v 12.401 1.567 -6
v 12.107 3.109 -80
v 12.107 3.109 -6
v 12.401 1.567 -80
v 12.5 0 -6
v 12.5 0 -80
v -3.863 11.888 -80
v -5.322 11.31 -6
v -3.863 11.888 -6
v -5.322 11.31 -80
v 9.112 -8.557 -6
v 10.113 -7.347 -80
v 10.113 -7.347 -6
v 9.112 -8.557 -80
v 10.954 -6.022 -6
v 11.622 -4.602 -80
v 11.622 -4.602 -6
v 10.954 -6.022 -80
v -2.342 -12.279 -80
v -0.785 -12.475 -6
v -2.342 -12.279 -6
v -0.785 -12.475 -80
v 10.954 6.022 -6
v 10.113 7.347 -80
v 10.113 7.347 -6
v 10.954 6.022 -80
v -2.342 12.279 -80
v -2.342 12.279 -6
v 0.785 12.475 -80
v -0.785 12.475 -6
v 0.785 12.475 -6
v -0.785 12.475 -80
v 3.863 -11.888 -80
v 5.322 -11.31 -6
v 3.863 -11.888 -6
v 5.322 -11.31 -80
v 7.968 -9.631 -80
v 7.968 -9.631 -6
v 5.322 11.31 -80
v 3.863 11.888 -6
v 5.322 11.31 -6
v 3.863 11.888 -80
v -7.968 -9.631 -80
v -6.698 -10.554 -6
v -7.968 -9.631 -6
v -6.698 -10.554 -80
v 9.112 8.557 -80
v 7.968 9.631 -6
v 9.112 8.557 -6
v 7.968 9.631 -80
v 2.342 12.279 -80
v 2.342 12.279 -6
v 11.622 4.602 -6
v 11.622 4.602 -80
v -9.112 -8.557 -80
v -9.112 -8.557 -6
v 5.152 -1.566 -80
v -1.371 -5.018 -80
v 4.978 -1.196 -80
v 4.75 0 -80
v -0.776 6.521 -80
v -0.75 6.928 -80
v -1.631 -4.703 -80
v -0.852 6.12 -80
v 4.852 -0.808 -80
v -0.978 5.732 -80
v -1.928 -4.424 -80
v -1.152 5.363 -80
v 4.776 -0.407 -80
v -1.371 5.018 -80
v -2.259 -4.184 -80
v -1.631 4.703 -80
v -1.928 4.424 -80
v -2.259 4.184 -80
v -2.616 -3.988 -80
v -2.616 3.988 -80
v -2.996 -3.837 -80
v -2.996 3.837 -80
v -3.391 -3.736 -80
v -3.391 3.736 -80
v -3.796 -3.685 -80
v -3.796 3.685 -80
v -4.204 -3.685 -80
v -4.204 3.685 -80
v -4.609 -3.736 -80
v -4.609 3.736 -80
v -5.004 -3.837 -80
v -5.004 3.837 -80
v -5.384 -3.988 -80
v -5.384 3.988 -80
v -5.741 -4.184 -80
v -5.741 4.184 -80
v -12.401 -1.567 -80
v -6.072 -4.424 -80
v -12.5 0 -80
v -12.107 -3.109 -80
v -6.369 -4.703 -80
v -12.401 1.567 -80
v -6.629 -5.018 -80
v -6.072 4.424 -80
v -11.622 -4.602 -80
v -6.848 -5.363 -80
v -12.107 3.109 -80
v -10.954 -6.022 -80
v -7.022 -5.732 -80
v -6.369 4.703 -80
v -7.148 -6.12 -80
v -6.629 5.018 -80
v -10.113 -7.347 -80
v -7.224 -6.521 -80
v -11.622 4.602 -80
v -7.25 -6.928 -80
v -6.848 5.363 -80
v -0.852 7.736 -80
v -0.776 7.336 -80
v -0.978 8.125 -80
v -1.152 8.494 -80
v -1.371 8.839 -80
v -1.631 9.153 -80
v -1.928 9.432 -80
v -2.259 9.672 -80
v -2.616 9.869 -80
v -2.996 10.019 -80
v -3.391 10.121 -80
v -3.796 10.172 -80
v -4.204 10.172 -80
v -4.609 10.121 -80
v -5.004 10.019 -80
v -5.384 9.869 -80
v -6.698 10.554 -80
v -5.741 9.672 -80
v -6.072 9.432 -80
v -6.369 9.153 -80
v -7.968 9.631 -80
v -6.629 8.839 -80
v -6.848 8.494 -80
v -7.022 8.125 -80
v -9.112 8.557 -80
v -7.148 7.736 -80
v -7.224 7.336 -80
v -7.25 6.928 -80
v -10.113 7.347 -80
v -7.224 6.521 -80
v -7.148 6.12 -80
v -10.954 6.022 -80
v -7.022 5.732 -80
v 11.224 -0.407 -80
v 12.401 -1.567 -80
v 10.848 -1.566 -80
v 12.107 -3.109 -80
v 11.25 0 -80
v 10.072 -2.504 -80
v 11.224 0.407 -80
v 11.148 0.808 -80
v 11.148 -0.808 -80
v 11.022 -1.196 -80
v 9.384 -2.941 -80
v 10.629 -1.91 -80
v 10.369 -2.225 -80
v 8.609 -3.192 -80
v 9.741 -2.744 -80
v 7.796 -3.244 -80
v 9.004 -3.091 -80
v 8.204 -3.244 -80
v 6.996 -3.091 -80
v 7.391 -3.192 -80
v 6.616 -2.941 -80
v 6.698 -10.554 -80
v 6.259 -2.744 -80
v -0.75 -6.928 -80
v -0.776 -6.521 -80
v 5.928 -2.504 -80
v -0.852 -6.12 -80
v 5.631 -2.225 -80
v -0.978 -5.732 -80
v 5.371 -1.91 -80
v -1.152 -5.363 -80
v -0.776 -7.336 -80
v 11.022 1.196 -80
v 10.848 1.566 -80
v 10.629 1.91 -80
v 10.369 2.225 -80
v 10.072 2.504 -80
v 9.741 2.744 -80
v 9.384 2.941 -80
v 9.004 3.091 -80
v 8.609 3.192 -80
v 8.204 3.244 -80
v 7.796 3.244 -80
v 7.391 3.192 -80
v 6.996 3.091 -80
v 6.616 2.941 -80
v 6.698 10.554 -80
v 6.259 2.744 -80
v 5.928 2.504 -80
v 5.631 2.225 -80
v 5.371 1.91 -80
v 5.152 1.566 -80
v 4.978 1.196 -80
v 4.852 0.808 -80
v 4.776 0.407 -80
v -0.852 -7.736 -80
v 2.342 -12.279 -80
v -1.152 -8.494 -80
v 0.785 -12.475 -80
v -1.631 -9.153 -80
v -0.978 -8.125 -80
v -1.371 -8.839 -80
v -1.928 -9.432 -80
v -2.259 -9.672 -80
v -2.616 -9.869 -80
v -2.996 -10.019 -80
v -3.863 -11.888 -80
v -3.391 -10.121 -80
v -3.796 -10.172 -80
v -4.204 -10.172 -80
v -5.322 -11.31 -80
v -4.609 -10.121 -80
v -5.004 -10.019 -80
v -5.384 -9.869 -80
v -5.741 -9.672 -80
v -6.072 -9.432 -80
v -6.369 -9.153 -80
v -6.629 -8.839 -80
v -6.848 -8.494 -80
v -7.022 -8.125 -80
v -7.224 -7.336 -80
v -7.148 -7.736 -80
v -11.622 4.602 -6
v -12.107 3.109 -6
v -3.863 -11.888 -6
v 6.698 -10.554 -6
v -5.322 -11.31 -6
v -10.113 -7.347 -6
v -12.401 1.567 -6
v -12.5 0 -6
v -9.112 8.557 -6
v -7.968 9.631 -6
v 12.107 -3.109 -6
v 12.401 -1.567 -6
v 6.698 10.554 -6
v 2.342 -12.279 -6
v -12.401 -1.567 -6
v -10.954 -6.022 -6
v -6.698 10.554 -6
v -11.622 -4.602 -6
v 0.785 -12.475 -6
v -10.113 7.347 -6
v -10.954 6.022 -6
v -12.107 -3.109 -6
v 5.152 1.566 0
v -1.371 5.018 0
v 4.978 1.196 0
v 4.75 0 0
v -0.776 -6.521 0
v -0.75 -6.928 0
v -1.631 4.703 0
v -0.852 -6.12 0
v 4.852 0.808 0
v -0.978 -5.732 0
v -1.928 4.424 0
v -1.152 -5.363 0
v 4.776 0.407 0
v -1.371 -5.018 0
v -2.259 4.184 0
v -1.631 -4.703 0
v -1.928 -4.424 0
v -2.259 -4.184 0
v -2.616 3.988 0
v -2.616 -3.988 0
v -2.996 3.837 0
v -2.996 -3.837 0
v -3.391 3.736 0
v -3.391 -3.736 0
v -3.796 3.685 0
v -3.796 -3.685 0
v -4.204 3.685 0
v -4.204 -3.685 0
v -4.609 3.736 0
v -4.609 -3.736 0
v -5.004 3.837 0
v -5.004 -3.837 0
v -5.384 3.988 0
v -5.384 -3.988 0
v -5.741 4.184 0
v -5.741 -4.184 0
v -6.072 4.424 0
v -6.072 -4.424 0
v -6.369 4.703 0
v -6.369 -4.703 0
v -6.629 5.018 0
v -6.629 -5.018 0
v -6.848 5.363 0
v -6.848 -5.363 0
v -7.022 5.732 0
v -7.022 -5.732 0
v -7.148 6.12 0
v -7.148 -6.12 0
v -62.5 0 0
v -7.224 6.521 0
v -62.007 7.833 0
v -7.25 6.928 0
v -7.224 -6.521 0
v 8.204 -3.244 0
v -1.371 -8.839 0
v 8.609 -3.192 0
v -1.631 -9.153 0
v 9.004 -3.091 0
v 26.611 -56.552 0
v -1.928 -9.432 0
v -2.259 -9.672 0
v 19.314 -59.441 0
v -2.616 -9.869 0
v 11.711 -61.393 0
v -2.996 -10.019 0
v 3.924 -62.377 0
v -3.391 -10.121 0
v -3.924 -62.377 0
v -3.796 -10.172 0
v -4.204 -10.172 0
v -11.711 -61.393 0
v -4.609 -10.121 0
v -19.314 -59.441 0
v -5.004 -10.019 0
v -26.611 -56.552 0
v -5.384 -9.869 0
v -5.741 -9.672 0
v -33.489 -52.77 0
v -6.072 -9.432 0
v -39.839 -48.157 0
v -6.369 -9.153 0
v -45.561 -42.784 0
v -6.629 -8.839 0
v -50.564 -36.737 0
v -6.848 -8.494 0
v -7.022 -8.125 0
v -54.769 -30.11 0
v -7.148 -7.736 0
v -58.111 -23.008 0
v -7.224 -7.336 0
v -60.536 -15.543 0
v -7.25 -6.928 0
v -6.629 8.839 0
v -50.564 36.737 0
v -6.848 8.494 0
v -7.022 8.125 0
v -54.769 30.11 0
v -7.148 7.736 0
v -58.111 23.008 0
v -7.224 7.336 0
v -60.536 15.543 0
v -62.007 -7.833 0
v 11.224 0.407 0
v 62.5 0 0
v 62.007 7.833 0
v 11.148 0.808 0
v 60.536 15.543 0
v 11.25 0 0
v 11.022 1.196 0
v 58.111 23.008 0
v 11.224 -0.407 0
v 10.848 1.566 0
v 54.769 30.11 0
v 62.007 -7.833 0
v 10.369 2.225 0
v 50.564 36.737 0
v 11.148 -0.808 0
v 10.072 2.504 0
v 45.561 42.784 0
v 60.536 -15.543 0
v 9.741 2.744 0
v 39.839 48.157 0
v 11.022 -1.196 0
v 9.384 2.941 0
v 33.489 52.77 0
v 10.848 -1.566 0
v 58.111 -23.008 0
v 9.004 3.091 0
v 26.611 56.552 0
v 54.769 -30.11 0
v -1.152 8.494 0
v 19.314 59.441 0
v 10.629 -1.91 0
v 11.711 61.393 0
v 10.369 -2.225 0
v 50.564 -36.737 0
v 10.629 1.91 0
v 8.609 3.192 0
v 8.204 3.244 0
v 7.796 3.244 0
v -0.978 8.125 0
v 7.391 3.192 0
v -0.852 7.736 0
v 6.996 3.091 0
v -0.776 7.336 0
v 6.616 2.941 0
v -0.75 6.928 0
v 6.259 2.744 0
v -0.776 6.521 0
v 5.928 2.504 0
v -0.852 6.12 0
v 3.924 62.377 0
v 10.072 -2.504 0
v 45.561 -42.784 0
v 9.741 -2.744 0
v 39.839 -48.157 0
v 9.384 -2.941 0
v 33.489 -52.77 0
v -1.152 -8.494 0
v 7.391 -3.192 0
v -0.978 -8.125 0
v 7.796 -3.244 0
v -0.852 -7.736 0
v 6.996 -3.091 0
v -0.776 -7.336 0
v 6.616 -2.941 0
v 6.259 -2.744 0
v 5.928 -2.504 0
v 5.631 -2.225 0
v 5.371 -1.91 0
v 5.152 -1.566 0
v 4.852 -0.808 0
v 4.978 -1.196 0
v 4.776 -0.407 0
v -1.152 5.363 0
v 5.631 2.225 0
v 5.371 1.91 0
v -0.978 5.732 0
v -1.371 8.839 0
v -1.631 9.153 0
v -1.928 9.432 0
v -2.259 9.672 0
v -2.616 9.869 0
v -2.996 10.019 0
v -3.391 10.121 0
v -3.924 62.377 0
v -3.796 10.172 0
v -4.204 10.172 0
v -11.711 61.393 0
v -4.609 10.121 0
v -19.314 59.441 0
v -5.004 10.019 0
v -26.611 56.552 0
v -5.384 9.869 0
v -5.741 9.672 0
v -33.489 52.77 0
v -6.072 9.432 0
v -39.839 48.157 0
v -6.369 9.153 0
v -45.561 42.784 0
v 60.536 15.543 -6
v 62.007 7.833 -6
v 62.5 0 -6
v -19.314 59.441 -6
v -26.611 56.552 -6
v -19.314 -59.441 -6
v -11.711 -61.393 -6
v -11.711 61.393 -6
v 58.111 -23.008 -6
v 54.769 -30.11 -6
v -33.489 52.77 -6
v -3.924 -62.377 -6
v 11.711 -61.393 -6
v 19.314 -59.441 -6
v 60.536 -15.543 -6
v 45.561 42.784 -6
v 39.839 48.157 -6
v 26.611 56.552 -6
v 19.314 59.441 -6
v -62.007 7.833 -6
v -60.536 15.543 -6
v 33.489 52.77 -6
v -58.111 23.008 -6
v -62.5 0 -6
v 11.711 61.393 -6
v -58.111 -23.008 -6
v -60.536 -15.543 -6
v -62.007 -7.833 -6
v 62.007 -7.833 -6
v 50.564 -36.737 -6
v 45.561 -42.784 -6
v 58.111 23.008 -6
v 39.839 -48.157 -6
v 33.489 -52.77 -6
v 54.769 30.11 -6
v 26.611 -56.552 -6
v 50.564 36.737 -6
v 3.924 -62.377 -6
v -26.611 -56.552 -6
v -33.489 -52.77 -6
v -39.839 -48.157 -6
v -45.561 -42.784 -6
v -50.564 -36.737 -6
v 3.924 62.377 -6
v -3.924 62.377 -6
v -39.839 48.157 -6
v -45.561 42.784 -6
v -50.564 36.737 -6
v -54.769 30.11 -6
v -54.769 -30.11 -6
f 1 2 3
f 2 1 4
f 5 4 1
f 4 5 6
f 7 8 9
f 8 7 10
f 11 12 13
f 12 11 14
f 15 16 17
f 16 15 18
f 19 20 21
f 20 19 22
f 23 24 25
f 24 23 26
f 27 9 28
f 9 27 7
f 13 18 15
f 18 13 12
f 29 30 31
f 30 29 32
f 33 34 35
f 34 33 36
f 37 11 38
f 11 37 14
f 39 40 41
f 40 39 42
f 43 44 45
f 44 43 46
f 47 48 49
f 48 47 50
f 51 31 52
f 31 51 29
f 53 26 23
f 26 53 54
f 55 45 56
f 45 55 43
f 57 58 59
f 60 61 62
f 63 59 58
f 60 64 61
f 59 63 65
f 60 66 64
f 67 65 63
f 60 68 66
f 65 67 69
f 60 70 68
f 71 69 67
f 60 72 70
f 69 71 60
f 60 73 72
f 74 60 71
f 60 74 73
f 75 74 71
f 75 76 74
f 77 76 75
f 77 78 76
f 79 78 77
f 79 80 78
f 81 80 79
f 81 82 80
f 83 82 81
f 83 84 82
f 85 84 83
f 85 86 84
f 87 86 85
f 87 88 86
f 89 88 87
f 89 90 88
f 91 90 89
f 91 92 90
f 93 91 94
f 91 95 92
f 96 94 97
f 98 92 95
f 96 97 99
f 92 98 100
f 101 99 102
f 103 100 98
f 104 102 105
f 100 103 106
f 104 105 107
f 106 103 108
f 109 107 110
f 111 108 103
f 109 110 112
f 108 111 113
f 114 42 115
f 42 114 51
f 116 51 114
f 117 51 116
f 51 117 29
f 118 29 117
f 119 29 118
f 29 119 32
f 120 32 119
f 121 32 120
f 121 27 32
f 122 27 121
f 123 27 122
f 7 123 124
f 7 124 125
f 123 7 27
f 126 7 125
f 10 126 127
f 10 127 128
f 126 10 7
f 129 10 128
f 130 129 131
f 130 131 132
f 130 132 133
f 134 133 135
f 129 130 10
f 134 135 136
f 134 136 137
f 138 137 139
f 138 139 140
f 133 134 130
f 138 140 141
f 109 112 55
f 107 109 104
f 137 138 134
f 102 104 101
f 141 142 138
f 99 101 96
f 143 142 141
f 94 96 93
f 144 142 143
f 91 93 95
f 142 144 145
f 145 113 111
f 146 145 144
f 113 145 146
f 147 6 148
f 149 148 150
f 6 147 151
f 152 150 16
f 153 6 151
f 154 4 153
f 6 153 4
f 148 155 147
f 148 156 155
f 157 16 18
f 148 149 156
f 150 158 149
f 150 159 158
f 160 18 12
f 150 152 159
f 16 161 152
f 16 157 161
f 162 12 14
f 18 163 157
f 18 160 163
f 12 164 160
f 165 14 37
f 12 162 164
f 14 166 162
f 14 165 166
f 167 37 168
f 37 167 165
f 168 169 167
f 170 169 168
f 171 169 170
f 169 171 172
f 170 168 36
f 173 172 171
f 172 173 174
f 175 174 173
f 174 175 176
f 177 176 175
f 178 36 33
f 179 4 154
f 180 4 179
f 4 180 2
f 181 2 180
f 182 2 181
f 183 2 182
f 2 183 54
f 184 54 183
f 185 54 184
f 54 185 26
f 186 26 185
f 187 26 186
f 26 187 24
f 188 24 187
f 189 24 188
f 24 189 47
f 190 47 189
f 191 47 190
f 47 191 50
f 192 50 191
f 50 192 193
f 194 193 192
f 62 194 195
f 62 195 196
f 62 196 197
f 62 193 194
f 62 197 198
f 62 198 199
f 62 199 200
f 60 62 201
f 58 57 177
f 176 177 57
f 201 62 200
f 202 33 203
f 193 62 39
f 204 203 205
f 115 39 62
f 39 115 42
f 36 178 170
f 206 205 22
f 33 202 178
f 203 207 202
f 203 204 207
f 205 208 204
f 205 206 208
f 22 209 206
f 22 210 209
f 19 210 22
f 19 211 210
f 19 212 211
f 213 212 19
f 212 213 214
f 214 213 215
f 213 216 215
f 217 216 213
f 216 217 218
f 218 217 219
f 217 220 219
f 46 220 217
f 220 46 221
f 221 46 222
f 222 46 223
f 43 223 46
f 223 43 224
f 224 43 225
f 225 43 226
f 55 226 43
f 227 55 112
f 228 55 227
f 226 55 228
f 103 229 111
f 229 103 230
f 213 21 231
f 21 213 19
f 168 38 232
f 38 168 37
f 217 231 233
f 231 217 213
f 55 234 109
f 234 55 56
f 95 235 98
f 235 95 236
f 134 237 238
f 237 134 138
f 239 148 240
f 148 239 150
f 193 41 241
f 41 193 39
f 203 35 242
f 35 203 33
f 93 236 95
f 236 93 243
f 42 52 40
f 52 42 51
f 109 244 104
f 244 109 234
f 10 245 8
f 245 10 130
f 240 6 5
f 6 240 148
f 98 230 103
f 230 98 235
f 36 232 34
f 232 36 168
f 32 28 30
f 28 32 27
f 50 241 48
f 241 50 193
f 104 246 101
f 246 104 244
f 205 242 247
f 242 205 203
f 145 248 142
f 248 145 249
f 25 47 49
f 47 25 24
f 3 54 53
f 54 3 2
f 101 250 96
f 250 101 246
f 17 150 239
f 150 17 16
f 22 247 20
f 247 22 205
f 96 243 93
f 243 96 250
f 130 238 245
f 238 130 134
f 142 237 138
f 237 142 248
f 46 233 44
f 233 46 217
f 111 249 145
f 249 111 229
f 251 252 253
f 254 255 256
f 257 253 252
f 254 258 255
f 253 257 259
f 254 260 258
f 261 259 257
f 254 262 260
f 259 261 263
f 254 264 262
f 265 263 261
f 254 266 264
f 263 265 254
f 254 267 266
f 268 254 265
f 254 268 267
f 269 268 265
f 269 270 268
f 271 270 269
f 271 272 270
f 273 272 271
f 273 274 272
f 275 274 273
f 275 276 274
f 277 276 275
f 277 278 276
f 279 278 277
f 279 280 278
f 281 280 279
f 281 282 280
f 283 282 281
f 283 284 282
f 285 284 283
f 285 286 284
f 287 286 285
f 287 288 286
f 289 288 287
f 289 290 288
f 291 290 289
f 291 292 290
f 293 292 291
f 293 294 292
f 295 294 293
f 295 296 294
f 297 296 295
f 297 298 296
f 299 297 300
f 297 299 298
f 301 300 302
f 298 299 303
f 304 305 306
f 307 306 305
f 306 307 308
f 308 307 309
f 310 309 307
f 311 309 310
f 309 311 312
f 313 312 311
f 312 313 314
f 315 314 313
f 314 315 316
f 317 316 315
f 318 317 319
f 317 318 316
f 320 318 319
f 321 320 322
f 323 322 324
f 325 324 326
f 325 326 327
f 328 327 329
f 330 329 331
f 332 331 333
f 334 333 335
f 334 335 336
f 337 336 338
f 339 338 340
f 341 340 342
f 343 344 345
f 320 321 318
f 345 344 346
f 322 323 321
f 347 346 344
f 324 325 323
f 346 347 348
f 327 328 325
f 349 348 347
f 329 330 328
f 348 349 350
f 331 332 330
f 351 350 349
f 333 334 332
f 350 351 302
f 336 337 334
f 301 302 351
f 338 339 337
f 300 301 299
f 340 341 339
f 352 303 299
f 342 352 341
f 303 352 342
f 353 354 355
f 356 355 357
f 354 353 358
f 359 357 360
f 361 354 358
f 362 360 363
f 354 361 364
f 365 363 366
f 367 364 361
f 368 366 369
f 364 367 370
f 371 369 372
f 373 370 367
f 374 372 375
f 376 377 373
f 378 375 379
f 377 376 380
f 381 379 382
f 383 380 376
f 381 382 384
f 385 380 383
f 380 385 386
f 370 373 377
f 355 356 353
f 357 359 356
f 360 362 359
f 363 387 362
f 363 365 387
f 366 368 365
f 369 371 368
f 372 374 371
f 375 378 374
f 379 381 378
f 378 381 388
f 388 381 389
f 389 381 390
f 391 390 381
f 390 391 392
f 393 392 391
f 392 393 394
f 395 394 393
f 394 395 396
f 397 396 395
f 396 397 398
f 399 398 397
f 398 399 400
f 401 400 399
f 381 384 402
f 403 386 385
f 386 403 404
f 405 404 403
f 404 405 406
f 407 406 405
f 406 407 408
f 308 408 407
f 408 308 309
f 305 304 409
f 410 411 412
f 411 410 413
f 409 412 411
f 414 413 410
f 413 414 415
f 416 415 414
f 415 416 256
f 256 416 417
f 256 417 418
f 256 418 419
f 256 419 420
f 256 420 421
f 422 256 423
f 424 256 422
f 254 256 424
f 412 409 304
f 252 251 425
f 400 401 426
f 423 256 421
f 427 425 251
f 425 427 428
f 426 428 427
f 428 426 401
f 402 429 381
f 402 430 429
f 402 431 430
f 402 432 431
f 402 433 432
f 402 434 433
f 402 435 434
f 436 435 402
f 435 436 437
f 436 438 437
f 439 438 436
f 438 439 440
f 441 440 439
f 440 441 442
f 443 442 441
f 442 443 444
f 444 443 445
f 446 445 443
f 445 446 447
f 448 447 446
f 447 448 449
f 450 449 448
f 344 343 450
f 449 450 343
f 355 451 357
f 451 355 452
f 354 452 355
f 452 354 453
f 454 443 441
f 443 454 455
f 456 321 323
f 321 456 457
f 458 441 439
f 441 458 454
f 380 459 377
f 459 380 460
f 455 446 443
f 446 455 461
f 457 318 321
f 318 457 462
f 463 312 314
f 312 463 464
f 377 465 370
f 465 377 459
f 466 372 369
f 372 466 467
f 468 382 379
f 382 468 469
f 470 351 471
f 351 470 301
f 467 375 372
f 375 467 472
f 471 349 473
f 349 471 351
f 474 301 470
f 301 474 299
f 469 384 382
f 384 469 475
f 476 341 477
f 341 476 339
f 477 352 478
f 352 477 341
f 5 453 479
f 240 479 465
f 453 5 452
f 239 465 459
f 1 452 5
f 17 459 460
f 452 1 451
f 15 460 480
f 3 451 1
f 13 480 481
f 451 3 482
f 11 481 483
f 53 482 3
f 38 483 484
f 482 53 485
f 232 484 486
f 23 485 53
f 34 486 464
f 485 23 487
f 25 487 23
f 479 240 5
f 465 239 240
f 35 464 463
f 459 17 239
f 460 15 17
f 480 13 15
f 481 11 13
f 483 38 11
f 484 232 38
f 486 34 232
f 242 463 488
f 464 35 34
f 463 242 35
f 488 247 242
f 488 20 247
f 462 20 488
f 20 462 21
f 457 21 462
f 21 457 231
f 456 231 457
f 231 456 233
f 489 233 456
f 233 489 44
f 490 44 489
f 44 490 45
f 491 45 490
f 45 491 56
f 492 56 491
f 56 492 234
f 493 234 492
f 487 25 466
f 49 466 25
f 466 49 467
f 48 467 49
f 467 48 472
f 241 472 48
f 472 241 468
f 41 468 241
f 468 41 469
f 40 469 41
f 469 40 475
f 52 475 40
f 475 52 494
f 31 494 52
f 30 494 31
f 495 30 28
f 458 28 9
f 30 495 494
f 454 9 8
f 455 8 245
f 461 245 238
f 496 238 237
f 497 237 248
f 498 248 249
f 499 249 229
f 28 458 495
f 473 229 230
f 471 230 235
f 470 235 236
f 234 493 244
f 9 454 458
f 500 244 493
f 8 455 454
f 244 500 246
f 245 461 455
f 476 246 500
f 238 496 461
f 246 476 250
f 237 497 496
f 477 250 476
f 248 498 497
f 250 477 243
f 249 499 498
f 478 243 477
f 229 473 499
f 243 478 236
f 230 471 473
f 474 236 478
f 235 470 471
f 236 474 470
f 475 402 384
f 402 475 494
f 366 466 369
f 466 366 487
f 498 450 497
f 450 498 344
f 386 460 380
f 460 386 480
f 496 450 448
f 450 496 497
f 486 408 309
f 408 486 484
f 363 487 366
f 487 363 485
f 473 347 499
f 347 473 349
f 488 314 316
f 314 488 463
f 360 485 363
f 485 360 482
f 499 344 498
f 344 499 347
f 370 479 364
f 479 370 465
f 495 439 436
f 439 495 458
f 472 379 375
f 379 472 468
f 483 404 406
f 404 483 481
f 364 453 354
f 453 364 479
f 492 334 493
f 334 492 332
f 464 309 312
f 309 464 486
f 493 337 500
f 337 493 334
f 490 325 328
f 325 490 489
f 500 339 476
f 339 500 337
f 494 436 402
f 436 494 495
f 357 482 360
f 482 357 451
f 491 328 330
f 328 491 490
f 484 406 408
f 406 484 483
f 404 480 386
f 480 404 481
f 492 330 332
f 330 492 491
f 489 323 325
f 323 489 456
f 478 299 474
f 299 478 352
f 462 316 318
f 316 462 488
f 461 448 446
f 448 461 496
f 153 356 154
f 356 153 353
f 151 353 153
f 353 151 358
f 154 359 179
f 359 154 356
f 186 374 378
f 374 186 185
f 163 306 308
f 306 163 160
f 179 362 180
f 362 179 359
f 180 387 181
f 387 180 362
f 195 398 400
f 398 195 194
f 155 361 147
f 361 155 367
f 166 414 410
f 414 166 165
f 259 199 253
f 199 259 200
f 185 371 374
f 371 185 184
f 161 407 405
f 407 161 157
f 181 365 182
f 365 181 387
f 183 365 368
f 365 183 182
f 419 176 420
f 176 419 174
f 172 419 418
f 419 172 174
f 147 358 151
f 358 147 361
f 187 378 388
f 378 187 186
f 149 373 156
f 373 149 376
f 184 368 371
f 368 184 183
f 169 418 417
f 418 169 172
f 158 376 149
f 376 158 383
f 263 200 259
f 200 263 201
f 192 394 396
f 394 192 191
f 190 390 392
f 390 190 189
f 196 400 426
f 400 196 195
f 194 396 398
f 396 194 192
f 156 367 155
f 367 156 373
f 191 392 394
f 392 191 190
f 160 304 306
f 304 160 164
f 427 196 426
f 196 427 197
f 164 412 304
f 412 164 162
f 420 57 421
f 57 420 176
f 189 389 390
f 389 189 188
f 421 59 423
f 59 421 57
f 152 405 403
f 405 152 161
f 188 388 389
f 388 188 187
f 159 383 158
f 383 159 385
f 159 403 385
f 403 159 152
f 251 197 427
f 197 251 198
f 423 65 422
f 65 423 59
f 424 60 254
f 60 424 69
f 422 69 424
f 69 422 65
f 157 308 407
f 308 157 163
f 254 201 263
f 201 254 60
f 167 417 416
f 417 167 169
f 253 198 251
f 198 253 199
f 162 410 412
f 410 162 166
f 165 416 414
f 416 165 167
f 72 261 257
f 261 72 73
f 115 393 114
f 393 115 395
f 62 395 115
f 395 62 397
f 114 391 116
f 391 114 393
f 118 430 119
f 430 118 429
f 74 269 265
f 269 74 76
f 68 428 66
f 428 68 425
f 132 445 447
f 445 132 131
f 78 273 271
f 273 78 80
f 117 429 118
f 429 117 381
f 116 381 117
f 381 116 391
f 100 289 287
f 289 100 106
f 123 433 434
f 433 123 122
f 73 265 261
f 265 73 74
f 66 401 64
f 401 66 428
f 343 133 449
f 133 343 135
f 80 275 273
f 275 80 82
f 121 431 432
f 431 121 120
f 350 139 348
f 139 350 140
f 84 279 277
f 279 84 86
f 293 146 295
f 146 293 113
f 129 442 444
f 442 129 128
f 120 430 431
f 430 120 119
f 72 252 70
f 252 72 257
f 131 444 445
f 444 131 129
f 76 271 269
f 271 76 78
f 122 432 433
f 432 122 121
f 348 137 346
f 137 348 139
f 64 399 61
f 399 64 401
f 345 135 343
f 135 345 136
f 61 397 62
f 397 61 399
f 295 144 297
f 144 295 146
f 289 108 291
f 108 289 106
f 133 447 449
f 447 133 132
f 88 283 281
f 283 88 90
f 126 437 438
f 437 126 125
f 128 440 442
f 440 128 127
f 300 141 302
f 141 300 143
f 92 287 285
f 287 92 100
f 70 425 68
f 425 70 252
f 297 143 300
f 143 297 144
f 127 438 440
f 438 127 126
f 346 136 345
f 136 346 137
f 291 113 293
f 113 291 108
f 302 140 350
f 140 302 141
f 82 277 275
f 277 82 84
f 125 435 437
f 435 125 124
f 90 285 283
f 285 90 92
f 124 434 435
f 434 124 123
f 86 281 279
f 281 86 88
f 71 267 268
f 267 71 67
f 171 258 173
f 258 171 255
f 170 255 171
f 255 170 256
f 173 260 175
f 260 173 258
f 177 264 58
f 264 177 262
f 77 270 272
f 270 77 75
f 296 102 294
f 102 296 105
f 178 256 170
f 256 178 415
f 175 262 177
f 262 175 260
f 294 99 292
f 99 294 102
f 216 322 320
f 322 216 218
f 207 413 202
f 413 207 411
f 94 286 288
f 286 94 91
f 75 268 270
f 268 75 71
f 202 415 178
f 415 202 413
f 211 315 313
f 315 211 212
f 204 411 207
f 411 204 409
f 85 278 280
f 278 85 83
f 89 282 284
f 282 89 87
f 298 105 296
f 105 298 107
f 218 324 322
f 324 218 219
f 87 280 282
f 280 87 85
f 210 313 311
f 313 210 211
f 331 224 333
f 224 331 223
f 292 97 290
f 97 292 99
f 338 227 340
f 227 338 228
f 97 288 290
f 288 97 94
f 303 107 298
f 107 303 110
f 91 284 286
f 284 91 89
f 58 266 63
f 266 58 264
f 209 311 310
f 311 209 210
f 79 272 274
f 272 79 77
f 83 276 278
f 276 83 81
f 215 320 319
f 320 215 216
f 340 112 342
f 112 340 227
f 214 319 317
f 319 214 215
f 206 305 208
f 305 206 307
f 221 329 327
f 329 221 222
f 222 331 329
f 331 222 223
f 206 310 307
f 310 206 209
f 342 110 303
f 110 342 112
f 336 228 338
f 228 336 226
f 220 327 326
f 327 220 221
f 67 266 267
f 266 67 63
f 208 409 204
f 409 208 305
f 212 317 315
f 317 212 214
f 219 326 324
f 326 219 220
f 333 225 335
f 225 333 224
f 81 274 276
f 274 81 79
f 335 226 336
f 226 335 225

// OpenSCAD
$fn = 50;


difference() {
	union() {
		translate(v = [0, 0, -80.0000000000]) {
			cylinder(h = 80, r = 12.5000000000);
		}
		translate(v = [0, 0, -6.0000000000]) {
			cylinder(h = 6, r = 62.5000000000);
		}
	}
	union() {
		#translate(v = [8.0000000000, 0.0000000000, -80]) {
			cylinder(h = 80, r = 3.2500000000);
		}
		#translate(v = [-4.0000000000, 6.9282032303, -80]) {
			cylinder(h = 80, r = 3.2500000000);
		}
		#translate(v = [-4.0000000000, -6.9282032303, -80]) {
			cylinder(h = 80, r = 3.2500000000);
		}
	}
}
